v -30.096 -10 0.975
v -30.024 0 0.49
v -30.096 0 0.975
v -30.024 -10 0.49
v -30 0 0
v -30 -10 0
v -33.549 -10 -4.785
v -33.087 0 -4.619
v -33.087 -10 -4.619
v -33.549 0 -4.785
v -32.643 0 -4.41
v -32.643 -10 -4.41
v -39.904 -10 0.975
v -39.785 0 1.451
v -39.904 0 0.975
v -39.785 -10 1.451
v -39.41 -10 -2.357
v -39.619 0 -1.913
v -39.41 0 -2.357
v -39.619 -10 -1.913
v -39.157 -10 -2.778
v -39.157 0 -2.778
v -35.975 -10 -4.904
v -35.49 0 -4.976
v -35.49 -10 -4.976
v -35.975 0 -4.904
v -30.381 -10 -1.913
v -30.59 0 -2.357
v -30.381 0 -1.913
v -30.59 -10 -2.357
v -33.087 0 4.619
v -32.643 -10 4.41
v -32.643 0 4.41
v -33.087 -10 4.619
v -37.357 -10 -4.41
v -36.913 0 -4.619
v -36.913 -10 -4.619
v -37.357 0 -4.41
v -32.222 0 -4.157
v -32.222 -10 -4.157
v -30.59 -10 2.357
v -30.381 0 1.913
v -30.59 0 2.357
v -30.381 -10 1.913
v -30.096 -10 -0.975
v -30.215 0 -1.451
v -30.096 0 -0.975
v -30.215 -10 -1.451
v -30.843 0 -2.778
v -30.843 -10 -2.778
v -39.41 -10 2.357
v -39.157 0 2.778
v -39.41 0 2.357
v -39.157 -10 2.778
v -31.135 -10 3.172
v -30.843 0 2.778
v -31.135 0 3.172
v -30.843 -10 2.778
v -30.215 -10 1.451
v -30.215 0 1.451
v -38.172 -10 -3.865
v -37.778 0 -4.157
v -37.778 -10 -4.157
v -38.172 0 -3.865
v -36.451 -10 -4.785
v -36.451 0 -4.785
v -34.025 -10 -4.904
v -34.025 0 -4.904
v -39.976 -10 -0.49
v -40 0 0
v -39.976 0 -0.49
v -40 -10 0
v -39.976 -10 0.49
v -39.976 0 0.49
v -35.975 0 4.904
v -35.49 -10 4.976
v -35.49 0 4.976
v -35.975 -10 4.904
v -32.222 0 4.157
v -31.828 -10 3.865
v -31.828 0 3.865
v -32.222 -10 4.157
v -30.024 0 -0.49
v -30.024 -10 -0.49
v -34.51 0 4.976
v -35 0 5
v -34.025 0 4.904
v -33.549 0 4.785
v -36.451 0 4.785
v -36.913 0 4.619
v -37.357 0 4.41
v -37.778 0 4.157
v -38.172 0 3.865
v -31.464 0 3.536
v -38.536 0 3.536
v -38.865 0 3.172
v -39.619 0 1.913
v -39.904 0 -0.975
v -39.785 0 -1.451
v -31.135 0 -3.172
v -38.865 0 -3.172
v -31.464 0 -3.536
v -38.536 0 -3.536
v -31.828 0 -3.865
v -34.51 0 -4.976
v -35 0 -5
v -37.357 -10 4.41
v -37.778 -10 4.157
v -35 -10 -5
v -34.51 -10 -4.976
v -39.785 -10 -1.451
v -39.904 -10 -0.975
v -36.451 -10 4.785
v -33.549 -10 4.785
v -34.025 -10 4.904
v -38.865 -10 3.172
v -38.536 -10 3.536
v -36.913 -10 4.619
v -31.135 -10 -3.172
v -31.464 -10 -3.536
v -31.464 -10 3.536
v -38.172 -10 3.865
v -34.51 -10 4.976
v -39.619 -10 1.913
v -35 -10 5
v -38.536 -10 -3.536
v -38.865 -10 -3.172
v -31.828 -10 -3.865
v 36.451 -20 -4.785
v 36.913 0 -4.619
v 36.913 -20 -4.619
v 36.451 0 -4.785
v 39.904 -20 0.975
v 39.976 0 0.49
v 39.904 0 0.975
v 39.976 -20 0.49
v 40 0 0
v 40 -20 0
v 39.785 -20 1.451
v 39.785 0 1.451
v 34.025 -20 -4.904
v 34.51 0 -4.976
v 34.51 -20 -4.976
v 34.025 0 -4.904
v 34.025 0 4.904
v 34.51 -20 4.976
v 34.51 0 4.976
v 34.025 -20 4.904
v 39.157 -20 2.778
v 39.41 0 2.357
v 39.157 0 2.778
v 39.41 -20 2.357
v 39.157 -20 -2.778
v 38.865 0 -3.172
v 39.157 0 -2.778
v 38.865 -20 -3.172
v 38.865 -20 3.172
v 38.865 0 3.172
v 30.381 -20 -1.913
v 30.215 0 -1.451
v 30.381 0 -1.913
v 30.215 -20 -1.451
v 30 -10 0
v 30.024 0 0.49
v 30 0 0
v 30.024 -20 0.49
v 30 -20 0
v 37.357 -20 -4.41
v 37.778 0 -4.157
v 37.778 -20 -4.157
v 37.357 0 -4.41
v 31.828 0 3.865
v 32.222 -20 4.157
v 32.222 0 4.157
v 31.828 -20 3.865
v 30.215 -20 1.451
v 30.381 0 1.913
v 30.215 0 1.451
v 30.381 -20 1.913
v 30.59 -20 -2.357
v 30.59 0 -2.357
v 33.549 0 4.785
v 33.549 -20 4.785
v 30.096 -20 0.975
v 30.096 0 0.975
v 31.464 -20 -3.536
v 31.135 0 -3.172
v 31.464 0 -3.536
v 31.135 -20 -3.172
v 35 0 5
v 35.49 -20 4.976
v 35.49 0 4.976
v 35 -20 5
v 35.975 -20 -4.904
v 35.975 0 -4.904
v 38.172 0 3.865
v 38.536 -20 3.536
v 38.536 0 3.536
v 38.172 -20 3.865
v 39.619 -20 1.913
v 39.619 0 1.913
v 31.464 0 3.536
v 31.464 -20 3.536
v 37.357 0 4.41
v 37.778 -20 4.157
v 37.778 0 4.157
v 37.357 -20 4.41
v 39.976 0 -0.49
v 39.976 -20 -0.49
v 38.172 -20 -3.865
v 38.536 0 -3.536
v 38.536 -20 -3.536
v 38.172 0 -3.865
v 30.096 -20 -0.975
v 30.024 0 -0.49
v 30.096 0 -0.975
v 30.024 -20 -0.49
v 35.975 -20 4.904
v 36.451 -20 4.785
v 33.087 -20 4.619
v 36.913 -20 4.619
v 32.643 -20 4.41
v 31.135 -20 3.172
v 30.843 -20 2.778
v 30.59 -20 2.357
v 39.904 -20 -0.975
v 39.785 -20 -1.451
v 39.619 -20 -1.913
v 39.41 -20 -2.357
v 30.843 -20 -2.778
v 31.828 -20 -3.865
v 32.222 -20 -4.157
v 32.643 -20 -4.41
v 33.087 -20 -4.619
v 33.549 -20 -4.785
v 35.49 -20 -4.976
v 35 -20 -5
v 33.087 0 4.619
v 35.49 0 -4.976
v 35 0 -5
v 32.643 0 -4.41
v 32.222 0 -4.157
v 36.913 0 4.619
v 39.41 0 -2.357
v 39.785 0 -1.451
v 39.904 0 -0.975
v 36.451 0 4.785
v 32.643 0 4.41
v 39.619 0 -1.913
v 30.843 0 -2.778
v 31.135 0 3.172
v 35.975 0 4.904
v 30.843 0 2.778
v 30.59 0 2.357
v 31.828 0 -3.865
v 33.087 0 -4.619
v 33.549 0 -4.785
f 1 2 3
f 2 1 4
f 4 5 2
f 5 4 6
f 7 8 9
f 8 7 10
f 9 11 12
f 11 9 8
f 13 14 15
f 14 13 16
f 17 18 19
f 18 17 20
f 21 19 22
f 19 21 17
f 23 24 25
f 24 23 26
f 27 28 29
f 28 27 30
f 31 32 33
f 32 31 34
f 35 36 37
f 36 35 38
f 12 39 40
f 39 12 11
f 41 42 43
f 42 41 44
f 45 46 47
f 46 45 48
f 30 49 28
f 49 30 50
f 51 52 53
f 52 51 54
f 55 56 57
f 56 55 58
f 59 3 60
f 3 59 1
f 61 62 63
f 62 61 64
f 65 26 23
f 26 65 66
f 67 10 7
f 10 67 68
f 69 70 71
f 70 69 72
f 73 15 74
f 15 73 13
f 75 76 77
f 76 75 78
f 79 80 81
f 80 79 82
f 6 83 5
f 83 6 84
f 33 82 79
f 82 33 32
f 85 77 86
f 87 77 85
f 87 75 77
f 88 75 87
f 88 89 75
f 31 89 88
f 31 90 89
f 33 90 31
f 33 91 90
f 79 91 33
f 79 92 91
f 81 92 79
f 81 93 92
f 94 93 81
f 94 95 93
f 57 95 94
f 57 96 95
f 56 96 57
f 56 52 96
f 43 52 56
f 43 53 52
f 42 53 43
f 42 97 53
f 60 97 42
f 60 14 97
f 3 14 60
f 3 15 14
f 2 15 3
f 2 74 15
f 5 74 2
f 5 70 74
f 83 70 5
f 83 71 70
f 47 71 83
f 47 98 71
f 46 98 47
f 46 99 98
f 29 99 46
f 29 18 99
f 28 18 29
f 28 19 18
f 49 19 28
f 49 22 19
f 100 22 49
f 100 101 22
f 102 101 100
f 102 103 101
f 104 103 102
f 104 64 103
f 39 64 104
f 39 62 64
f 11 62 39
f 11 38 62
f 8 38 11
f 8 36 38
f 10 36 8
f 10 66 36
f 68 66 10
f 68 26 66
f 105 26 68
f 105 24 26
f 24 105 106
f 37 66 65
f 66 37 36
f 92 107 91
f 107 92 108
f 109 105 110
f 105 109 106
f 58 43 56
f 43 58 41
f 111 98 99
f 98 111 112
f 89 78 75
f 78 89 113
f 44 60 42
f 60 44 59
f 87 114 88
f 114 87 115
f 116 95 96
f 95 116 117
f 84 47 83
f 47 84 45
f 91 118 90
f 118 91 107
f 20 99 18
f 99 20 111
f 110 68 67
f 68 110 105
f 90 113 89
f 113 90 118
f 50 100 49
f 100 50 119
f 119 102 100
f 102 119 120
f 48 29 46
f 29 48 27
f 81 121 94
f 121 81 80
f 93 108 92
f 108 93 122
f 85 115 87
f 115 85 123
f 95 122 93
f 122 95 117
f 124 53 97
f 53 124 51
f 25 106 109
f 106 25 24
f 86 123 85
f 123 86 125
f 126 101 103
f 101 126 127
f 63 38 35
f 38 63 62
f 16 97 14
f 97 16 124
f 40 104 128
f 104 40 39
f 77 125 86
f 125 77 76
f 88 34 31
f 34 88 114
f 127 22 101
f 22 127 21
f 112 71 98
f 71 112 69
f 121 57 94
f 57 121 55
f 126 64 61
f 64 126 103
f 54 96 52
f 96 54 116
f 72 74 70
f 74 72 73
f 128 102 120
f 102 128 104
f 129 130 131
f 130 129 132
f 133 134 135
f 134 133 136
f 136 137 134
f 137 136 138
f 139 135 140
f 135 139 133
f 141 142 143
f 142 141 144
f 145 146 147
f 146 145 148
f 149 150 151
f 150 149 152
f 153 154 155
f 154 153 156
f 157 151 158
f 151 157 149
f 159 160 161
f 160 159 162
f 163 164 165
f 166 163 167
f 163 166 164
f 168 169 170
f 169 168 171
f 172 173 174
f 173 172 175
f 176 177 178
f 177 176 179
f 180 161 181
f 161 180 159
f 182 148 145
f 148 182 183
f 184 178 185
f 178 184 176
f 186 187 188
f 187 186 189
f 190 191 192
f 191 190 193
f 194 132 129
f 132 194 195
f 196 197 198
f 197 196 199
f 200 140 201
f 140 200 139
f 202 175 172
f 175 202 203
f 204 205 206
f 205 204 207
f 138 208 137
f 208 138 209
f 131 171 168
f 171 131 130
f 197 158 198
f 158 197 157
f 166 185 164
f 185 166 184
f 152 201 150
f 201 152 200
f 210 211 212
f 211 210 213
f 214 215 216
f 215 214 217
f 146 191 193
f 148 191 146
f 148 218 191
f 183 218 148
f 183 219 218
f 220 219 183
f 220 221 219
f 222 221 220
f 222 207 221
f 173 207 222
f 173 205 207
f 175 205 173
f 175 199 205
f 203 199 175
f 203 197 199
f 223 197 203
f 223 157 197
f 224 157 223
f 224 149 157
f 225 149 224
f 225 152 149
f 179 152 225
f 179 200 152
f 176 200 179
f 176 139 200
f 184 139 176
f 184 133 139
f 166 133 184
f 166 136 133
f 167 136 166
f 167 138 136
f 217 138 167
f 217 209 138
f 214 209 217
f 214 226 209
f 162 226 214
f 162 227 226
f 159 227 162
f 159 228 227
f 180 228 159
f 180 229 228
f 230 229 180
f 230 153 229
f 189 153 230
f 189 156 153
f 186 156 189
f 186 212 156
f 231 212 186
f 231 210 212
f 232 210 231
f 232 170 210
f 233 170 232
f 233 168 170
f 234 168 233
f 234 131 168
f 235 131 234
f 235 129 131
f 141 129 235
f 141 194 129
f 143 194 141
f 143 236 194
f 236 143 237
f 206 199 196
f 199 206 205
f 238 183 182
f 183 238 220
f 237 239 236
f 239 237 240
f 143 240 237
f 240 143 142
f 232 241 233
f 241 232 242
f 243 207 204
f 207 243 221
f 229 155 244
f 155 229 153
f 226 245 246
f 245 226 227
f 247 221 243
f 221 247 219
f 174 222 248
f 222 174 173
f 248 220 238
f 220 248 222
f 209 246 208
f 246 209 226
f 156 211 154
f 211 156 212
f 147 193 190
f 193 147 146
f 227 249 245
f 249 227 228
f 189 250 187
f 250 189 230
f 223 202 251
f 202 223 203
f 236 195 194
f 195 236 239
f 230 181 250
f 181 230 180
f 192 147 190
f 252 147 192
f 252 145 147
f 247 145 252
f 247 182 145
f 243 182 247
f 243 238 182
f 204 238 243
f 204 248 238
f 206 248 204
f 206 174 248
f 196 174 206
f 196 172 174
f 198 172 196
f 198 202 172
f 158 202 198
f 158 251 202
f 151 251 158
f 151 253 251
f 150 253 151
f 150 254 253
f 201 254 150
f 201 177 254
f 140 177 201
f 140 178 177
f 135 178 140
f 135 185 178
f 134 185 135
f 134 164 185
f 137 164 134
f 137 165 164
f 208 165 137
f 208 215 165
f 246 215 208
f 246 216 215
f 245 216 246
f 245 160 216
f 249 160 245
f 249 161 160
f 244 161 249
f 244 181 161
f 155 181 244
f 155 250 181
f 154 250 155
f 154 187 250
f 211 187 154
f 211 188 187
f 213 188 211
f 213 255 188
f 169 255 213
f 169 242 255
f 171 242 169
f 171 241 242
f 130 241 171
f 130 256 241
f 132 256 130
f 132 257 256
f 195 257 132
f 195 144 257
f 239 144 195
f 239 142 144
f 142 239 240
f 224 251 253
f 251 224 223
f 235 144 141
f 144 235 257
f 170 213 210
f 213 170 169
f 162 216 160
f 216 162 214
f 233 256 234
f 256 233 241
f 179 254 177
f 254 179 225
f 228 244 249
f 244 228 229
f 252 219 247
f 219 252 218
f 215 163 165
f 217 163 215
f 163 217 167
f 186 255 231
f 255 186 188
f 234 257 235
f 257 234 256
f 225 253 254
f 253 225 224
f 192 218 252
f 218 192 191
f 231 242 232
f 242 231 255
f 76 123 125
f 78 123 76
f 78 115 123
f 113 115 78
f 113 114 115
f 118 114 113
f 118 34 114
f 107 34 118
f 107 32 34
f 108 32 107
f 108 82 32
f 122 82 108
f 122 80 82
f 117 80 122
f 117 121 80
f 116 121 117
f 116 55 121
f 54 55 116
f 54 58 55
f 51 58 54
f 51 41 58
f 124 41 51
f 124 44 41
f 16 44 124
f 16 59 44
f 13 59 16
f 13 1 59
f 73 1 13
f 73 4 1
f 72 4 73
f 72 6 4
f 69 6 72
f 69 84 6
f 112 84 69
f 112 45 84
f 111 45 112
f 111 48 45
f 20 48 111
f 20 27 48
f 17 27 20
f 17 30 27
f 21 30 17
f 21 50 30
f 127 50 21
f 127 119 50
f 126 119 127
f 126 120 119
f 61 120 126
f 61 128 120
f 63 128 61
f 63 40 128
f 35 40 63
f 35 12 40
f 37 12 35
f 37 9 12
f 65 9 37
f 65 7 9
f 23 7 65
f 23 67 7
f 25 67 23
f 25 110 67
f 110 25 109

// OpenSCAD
module d_connector() {
    difference() {
        union() {
            // Main body
            translate([-30, -10, 0])
            cube([60, 20, 5]);

            // Rounded ends
            translate([-35, 0, 0])
            rotate([90, 0, 0])
            cylinder(h=20, r=5, $fn=64);

            translate([35, 0, 0])
            rotate([90, 0, 0])
            cylinder(h=20, r=5, $fn=64);
        }

        // Cut out the top to create the D shape
        translate([-30, -10, 0])
        cube([60, 20, 5]);

        translate([-30, -10, 0])
        rotate([90, 0, 0])
        cylinder(h=20, r=10, $fn=64);
    }
}

d_connector();
